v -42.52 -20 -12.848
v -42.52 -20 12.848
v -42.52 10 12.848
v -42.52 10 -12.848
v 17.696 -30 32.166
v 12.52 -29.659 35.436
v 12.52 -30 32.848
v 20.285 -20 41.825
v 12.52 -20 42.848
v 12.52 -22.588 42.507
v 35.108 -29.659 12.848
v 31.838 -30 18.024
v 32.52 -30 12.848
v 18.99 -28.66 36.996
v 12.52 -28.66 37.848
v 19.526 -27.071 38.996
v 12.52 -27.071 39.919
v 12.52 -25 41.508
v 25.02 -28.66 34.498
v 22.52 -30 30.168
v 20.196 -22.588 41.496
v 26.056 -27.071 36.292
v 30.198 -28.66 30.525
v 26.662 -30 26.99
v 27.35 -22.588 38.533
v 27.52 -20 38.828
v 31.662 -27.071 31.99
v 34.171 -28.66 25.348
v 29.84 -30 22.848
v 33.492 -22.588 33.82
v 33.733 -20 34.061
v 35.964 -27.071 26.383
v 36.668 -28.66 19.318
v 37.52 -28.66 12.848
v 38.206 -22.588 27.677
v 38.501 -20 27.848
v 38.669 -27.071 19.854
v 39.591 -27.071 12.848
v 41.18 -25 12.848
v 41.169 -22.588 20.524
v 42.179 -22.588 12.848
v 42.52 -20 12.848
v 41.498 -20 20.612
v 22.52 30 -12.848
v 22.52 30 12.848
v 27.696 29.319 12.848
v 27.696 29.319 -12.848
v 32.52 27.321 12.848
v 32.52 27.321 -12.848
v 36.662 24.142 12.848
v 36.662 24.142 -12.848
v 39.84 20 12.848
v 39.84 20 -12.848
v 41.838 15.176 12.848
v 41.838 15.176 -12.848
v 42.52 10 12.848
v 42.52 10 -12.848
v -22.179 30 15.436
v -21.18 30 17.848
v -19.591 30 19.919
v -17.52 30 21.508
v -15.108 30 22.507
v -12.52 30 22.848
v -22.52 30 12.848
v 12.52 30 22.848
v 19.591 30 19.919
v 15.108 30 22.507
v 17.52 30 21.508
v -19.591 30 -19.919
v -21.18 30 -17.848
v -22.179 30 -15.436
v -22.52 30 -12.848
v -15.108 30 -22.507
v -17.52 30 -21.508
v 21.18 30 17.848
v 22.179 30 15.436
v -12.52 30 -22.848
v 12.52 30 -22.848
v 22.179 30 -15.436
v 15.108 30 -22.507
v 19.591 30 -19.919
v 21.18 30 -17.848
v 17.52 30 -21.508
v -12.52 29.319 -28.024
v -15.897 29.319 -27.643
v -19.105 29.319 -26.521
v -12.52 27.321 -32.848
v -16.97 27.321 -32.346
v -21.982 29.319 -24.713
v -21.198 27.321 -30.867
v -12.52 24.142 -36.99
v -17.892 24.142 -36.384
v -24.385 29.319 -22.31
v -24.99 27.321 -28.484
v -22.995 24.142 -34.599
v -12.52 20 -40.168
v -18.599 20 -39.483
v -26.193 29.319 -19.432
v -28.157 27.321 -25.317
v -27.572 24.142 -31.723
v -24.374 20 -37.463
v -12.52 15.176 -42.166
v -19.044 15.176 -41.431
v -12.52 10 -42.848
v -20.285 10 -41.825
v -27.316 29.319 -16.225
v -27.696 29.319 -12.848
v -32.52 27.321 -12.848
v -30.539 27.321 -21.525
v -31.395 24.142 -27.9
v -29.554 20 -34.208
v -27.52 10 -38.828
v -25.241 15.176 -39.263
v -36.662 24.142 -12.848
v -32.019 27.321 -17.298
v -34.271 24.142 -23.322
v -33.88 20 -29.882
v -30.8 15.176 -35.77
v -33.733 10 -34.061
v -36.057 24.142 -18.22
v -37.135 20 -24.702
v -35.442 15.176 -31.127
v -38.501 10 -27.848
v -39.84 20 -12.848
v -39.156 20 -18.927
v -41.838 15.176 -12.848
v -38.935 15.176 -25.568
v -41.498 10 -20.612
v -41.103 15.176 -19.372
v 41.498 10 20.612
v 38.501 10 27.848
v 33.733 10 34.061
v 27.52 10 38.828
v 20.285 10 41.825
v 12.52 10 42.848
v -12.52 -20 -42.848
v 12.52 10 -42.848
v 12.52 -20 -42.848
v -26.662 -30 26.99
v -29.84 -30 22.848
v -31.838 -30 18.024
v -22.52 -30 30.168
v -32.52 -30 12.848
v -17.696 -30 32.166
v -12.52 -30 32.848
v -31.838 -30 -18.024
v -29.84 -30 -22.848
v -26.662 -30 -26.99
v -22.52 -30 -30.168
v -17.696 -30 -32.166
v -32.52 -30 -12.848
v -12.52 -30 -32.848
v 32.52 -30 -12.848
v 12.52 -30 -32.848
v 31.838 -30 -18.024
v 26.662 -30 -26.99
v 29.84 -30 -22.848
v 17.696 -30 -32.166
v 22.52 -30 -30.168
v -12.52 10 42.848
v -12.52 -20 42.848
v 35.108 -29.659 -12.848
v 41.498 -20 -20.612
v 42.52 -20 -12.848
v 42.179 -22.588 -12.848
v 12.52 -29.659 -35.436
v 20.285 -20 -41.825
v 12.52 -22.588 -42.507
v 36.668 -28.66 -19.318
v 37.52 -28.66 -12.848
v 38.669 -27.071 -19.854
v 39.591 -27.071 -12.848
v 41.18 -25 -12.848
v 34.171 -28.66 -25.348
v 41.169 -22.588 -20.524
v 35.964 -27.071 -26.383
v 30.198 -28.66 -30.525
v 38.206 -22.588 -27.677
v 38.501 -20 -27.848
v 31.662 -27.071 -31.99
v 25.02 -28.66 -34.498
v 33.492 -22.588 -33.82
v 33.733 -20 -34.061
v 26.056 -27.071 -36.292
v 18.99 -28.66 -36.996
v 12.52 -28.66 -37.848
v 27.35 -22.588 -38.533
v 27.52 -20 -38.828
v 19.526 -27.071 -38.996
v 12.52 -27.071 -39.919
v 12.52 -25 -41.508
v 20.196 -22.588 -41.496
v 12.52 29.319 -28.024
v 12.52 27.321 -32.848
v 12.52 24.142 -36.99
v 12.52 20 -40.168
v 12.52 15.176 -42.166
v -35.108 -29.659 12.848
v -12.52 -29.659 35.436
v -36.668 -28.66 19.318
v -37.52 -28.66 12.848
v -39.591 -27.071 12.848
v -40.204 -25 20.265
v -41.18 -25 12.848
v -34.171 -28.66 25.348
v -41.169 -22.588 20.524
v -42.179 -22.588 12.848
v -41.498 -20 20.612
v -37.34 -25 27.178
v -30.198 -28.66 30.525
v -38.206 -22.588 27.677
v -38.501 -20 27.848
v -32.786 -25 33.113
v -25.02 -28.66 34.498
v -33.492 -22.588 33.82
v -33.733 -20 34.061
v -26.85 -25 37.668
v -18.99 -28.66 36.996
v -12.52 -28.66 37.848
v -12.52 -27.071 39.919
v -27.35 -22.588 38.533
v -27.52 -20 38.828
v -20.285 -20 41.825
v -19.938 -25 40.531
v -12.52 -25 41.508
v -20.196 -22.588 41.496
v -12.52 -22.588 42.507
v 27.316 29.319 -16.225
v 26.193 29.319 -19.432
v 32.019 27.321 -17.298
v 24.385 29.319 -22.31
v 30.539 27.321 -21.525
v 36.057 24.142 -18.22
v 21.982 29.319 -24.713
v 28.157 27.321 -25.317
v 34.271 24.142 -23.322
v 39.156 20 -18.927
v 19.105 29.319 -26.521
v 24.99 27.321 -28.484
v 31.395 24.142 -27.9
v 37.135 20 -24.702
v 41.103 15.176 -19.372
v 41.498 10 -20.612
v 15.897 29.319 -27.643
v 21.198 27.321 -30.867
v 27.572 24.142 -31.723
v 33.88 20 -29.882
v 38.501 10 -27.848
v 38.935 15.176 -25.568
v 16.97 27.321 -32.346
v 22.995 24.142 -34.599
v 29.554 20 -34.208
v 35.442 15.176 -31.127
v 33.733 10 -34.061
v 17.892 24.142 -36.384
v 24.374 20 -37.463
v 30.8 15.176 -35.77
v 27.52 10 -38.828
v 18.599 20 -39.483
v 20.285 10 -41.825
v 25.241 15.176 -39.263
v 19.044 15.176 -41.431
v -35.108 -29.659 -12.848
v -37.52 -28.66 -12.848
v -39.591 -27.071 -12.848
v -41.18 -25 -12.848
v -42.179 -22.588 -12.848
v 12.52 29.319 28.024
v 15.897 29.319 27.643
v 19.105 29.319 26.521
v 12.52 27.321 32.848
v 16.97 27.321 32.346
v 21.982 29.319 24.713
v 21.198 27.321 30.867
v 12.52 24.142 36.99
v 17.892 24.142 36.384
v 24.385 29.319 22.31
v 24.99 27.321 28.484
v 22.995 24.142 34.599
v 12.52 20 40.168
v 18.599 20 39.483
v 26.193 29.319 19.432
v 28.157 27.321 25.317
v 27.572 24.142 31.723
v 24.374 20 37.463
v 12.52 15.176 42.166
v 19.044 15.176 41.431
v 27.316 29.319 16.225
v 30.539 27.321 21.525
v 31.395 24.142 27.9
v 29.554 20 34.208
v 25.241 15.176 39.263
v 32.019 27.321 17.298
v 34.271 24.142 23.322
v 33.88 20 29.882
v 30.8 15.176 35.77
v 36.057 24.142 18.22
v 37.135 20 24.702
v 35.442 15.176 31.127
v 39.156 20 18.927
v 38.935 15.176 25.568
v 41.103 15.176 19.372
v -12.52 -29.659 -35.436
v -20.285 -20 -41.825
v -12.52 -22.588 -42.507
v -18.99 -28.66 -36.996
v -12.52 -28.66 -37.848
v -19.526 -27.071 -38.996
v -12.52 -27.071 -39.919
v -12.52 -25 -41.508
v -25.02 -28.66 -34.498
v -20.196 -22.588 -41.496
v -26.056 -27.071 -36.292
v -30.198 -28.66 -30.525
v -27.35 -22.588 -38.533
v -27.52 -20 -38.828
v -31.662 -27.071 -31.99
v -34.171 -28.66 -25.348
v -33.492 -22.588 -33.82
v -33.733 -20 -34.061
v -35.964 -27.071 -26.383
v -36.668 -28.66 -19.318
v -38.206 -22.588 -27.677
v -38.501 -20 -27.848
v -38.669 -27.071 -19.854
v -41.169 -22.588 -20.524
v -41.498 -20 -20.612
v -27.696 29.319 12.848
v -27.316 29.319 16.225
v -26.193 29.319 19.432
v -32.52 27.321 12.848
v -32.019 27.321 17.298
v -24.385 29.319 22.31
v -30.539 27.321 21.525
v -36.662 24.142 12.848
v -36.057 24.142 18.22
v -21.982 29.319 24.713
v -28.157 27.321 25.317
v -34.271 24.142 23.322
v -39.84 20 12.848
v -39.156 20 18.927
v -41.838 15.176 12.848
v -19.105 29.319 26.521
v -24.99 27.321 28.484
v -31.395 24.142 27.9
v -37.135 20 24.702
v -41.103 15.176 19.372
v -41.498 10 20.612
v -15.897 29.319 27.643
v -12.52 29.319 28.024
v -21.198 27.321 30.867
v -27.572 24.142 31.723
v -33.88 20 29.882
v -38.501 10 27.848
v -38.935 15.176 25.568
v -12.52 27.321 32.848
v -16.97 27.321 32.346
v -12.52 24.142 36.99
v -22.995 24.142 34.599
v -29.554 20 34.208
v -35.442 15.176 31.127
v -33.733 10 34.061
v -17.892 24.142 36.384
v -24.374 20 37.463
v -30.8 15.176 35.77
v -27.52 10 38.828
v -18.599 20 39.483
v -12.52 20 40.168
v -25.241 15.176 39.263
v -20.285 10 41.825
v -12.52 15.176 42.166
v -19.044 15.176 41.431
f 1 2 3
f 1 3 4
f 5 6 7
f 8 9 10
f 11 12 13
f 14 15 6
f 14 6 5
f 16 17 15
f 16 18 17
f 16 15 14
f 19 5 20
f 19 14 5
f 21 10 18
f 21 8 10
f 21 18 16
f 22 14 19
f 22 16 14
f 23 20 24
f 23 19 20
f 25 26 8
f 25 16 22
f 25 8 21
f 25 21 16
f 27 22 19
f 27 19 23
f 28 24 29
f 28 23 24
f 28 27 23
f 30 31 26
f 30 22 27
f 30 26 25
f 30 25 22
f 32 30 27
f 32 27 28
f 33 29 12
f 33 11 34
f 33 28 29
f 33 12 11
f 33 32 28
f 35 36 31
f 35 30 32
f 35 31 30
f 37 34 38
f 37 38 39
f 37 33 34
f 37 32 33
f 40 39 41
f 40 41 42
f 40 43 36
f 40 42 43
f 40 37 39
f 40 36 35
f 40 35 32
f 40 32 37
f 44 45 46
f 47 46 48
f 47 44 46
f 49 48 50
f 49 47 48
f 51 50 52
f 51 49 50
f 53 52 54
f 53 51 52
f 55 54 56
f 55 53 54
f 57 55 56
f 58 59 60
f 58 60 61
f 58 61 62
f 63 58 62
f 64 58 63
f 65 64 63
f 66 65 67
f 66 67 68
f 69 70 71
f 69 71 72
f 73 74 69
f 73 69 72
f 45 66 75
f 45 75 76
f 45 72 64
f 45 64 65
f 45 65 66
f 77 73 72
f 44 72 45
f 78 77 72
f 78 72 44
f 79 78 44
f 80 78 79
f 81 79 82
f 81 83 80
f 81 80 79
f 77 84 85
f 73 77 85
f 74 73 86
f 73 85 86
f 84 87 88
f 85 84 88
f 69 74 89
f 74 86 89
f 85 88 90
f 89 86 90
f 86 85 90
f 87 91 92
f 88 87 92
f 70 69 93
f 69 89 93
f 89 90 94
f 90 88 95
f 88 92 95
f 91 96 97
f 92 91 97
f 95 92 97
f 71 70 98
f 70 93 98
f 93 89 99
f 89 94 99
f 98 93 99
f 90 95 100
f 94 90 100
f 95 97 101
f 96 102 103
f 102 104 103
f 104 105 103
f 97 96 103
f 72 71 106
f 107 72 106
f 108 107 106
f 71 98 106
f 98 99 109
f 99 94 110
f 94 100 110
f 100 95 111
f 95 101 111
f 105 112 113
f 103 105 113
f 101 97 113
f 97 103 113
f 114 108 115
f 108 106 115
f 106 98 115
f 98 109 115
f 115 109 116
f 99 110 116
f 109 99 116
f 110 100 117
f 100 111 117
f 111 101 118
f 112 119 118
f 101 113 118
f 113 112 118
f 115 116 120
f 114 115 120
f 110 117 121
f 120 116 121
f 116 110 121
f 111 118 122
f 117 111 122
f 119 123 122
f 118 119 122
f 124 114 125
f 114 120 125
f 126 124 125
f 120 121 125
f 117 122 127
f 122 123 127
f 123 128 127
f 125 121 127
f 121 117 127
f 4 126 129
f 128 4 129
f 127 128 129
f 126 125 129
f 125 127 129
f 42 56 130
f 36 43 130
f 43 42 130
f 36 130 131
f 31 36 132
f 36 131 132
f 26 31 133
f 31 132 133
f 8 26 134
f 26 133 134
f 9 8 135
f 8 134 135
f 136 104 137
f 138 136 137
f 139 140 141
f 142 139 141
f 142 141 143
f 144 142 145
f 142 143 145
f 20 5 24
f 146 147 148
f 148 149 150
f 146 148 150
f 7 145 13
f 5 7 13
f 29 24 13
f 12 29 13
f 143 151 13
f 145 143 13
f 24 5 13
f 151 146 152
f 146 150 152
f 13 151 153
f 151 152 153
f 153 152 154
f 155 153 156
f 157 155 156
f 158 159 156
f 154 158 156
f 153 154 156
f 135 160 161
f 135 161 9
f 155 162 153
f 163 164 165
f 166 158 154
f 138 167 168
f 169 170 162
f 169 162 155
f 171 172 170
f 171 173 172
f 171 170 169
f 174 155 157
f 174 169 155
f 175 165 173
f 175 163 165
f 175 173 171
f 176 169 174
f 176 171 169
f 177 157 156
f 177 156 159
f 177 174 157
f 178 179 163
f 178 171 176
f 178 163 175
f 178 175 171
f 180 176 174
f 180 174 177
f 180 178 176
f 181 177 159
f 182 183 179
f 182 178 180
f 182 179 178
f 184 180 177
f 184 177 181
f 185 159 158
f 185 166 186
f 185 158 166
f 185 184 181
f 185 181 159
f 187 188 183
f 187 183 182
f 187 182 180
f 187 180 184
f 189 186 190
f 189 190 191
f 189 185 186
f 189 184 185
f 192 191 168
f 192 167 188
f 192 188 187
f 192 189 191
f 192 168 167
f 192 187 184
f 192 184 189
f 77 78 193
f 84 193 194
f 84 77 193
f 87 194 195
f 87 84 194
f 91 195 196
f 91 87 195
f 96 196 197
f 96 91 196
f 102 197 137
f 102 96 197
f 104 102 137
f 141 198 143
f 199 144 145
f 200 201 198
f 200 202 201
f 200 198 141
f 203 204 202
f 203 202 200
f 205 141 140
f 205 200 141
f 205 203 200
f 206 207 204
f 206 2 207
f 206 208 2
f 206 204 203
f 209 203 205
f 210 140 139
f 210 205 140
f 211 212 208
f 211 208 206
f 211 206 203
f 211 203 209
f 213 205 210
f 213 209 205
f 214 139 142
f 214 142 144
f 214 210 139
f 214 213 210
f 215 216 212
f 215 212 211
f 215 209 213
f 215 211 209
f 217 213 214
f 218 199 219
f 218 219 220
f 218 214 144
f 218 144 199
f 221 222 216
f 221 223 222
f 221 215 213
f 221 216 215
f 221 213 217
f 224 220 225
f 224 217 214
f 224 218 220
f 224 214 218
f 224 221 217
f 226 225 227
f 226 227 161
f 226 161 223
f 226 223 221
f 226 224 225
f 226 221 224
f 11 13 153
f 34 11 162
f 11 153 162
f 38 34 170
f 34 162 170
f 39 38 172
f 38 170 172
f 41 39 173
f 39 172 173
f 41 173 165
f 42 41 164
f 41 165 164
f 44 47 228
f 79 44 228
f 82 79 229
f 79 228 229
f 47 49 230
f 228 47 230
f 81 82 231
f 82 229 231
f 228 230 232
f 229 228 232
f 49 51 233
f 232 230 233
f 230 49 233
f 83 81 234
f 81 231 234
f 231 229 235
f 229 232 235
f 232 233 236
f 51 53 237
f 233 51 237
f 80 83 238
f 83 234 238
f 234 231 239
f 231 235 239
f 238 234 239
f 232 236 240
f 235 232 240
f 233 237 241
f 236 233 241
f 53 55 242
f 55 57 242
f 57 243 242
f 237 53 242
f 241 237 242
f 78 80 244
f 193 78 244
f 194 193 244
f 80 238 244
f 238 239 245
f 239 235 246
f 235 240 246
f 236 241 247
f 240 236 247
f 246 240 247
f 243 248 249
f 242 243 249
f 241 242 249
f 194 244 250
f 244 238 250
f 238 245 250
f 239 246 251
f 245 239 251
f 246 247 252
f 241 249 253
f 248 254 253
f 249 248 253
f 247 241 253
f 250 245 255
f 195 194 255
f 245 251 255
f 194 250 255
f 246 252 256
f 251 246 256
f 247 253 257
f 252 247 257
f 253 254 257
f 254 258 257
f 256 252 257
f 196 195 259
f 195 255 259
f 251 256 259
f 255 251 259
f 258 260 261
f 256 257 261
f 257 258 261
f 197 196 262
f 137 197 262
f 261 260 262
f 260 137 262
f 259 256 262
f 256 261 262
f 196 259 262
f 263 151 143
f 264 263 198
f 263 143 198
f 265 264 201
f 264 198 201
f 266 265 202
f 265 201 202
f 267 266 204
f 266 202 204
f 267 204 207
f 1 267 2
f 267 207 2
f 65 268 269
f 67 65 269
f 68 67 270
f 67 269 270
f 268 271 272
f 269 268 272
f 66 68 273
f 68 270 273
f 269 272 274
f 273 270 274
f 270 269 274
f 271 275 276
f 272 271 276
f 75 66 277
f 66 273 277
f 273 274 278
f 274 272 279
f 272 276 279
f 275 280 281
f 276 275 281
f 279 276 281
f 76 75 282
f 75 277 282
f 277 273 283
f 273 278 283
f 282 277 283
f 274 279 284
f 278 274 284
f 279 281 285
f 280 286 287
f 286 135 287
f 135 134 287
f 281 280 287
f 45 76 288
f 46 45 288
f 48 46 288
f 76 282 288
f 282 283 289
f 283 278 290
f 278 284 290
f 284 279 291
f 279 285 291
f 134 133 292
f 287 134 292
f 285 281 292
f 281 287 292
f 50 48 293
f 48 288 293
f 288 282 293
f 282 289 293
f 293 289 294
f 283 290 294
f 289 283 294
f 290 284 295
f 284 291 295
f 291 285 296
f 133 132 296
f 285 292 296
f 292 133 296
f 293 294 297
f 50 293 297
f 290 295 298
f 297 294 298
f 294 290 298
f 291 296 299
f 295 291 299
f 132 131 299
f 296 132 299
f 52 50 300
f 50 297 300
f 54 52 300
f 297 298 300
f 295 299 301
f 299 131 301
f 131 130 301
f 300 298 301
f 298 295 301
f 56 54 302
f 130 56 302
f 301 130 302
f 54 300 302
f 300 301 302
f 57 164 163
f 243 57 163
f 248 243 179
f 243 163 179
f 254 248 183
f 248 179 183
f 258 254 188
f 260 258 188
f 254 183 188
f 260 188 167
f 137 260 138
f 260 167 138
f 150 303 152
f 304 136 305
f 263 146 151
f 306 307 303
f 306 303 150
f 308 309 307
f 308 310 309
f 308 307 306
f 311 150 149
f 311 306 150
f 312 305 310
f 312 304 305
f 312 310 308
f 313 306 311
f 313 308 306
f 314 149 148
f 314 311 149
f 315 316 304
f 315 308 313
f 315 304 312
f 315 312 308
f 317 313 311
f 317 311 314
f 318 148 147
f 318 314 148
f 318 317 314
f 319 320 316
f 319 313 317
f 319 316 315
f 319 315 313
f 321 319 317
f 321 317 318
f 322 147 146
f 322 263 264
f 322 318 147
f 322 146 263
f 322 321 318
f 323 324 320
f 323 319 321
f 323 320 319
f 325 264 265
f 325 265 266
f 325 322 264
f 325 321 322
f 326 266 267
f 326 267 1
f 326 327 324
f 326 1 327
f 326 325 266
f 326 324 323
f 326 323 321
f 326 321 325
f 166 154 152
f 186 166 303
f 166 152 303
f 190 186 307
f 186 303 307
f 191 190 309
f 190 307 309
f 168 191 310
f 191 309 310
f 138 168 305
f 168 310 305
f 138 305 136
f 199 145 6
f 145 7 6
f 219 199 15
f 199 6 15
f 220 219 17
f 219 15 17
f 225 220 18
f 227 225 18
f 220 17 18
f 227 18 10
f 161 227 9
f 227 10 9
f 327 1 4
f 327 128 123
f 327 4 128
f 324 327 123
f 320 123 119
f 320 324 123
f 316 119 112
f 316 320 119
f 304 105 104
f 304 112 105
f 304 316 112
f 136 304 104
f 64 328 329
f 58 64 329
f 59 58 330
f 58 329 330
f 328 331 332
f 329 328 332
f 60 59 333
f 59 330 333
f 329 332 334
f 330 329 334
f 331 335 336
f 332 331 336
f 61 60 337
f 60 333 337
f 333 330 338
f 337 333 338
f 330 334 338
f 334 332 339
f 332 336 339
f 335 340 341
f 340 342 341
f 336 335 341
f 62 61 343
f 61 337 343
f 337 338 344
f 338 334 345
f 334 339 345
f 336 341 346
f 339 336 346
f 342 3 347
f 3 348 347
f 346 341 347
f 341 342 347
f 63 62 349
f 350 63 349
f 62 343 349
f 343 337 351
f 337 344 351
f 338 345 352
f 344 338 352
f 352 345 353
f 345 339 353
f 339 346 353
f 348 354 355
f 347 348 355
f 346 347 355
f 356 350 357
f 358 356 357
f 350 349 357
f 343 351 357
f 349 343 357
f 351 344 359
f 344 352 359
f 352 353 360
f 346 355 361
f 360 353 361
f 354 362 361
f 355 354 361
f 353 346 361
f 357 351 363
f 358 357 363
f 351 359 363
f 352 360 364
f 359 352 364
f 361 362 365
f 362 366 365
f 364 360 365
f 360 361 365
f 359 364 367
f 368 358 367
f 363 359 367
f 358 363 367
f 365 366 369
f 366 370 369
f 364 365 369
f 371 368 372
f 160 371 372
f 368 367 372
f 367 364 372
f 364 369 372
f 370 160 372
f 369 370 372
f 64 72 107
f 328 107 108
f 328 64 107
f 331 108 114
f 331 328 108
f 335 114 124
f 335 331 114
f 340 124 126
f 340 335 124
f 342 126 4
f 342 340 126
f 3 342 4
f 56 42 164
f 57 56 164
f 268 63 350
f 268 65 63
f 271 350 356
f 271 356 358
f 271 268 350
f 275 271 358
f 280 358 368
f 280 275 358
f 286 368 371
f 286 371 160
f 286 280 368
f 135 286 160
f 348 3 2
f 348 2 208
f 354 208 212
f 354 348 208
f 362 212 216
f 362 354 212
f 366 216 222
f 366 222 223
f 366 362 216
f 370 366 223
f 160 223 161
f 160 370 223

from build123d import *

# Parameters (mm, degrees)
SKETCH1_W                = 85.03995341
SKETCH1_H                = 85.695176246
BOSS_EXTRUDE1_DEPTH      = 30
BOSS_EXTRUDE1_DEPTH_BACK = 30
FILLET1_R                = 30
FILLET2_R                = 20
FILLET3_R                = 10


with BuildPart() as part:
    # Sketch1 → Boss-Extrude1 (new body, two sides)
    with BuildSketch(Plane(origin=(0, 0, 0), x_dir=(1, 0, 0), z_dir=(0, 1, 0))) as boss_extrude1_sk:
        Rectangle(SKETCH1_W, SKETCH1_H)
    extrude(amount=BOSS_EXTRUDE1_DEPTH)
    extrude(boss_extrude1_sk.sketch, amount=-BOSS_EXTRUDE1_DEPTH_BACK)

    # Fillet1
    fillet1_edges = [part.edges().sort_by_distance(p)[0] for p in [
        (42.519976705, 0, 42.847588123),
        (-42.519976705, 0, 42.847588123),
        (-42.519976705, 0, -42.847588123),
        (42.519976705, 0, -42.847588123),
    ]]
    fillet(fillet1_edges, radius=FILLET1_R)

    # Fillet2
    fillet2_edges = [part.edges().sort_by_distance(p)[0] for p in [
        (0, 30, 42.847588123),
        (42.519976705, 30, 0),
        (0, 30, -42.847588123),
        (-42.519976705, 30, 0),
        (-33.73318014, 30, -34.060791558),
        (-33.73318014, 30, 34.060791558),
        (33.73318014, 30, -34.060791558),
        (33.73318014, 30, 34.060791558),
    ]]
    fillet(fillet2_edges, radius=FILLET2_R)

    # Fillet3
    fillet3_edges = [part.edges().sort_by_distance(p)[0] for p in [
        (0, -30, 42.847588123),
        (42.519976705, -30, 0),
        (-42.519976705, -30, 0),
        (0, -30, -42.847588123),
        (-33.73318014, -30, -34.060791558),
        (-33.73318014, -30, 34.060791558),
        (33.73318014, -30, -34.060791558),
        (33.73318014, -30, 34.060791558),
    ]]
    fillet(fillet3_edges, radius=FILLET3_R)


solid = part.part
